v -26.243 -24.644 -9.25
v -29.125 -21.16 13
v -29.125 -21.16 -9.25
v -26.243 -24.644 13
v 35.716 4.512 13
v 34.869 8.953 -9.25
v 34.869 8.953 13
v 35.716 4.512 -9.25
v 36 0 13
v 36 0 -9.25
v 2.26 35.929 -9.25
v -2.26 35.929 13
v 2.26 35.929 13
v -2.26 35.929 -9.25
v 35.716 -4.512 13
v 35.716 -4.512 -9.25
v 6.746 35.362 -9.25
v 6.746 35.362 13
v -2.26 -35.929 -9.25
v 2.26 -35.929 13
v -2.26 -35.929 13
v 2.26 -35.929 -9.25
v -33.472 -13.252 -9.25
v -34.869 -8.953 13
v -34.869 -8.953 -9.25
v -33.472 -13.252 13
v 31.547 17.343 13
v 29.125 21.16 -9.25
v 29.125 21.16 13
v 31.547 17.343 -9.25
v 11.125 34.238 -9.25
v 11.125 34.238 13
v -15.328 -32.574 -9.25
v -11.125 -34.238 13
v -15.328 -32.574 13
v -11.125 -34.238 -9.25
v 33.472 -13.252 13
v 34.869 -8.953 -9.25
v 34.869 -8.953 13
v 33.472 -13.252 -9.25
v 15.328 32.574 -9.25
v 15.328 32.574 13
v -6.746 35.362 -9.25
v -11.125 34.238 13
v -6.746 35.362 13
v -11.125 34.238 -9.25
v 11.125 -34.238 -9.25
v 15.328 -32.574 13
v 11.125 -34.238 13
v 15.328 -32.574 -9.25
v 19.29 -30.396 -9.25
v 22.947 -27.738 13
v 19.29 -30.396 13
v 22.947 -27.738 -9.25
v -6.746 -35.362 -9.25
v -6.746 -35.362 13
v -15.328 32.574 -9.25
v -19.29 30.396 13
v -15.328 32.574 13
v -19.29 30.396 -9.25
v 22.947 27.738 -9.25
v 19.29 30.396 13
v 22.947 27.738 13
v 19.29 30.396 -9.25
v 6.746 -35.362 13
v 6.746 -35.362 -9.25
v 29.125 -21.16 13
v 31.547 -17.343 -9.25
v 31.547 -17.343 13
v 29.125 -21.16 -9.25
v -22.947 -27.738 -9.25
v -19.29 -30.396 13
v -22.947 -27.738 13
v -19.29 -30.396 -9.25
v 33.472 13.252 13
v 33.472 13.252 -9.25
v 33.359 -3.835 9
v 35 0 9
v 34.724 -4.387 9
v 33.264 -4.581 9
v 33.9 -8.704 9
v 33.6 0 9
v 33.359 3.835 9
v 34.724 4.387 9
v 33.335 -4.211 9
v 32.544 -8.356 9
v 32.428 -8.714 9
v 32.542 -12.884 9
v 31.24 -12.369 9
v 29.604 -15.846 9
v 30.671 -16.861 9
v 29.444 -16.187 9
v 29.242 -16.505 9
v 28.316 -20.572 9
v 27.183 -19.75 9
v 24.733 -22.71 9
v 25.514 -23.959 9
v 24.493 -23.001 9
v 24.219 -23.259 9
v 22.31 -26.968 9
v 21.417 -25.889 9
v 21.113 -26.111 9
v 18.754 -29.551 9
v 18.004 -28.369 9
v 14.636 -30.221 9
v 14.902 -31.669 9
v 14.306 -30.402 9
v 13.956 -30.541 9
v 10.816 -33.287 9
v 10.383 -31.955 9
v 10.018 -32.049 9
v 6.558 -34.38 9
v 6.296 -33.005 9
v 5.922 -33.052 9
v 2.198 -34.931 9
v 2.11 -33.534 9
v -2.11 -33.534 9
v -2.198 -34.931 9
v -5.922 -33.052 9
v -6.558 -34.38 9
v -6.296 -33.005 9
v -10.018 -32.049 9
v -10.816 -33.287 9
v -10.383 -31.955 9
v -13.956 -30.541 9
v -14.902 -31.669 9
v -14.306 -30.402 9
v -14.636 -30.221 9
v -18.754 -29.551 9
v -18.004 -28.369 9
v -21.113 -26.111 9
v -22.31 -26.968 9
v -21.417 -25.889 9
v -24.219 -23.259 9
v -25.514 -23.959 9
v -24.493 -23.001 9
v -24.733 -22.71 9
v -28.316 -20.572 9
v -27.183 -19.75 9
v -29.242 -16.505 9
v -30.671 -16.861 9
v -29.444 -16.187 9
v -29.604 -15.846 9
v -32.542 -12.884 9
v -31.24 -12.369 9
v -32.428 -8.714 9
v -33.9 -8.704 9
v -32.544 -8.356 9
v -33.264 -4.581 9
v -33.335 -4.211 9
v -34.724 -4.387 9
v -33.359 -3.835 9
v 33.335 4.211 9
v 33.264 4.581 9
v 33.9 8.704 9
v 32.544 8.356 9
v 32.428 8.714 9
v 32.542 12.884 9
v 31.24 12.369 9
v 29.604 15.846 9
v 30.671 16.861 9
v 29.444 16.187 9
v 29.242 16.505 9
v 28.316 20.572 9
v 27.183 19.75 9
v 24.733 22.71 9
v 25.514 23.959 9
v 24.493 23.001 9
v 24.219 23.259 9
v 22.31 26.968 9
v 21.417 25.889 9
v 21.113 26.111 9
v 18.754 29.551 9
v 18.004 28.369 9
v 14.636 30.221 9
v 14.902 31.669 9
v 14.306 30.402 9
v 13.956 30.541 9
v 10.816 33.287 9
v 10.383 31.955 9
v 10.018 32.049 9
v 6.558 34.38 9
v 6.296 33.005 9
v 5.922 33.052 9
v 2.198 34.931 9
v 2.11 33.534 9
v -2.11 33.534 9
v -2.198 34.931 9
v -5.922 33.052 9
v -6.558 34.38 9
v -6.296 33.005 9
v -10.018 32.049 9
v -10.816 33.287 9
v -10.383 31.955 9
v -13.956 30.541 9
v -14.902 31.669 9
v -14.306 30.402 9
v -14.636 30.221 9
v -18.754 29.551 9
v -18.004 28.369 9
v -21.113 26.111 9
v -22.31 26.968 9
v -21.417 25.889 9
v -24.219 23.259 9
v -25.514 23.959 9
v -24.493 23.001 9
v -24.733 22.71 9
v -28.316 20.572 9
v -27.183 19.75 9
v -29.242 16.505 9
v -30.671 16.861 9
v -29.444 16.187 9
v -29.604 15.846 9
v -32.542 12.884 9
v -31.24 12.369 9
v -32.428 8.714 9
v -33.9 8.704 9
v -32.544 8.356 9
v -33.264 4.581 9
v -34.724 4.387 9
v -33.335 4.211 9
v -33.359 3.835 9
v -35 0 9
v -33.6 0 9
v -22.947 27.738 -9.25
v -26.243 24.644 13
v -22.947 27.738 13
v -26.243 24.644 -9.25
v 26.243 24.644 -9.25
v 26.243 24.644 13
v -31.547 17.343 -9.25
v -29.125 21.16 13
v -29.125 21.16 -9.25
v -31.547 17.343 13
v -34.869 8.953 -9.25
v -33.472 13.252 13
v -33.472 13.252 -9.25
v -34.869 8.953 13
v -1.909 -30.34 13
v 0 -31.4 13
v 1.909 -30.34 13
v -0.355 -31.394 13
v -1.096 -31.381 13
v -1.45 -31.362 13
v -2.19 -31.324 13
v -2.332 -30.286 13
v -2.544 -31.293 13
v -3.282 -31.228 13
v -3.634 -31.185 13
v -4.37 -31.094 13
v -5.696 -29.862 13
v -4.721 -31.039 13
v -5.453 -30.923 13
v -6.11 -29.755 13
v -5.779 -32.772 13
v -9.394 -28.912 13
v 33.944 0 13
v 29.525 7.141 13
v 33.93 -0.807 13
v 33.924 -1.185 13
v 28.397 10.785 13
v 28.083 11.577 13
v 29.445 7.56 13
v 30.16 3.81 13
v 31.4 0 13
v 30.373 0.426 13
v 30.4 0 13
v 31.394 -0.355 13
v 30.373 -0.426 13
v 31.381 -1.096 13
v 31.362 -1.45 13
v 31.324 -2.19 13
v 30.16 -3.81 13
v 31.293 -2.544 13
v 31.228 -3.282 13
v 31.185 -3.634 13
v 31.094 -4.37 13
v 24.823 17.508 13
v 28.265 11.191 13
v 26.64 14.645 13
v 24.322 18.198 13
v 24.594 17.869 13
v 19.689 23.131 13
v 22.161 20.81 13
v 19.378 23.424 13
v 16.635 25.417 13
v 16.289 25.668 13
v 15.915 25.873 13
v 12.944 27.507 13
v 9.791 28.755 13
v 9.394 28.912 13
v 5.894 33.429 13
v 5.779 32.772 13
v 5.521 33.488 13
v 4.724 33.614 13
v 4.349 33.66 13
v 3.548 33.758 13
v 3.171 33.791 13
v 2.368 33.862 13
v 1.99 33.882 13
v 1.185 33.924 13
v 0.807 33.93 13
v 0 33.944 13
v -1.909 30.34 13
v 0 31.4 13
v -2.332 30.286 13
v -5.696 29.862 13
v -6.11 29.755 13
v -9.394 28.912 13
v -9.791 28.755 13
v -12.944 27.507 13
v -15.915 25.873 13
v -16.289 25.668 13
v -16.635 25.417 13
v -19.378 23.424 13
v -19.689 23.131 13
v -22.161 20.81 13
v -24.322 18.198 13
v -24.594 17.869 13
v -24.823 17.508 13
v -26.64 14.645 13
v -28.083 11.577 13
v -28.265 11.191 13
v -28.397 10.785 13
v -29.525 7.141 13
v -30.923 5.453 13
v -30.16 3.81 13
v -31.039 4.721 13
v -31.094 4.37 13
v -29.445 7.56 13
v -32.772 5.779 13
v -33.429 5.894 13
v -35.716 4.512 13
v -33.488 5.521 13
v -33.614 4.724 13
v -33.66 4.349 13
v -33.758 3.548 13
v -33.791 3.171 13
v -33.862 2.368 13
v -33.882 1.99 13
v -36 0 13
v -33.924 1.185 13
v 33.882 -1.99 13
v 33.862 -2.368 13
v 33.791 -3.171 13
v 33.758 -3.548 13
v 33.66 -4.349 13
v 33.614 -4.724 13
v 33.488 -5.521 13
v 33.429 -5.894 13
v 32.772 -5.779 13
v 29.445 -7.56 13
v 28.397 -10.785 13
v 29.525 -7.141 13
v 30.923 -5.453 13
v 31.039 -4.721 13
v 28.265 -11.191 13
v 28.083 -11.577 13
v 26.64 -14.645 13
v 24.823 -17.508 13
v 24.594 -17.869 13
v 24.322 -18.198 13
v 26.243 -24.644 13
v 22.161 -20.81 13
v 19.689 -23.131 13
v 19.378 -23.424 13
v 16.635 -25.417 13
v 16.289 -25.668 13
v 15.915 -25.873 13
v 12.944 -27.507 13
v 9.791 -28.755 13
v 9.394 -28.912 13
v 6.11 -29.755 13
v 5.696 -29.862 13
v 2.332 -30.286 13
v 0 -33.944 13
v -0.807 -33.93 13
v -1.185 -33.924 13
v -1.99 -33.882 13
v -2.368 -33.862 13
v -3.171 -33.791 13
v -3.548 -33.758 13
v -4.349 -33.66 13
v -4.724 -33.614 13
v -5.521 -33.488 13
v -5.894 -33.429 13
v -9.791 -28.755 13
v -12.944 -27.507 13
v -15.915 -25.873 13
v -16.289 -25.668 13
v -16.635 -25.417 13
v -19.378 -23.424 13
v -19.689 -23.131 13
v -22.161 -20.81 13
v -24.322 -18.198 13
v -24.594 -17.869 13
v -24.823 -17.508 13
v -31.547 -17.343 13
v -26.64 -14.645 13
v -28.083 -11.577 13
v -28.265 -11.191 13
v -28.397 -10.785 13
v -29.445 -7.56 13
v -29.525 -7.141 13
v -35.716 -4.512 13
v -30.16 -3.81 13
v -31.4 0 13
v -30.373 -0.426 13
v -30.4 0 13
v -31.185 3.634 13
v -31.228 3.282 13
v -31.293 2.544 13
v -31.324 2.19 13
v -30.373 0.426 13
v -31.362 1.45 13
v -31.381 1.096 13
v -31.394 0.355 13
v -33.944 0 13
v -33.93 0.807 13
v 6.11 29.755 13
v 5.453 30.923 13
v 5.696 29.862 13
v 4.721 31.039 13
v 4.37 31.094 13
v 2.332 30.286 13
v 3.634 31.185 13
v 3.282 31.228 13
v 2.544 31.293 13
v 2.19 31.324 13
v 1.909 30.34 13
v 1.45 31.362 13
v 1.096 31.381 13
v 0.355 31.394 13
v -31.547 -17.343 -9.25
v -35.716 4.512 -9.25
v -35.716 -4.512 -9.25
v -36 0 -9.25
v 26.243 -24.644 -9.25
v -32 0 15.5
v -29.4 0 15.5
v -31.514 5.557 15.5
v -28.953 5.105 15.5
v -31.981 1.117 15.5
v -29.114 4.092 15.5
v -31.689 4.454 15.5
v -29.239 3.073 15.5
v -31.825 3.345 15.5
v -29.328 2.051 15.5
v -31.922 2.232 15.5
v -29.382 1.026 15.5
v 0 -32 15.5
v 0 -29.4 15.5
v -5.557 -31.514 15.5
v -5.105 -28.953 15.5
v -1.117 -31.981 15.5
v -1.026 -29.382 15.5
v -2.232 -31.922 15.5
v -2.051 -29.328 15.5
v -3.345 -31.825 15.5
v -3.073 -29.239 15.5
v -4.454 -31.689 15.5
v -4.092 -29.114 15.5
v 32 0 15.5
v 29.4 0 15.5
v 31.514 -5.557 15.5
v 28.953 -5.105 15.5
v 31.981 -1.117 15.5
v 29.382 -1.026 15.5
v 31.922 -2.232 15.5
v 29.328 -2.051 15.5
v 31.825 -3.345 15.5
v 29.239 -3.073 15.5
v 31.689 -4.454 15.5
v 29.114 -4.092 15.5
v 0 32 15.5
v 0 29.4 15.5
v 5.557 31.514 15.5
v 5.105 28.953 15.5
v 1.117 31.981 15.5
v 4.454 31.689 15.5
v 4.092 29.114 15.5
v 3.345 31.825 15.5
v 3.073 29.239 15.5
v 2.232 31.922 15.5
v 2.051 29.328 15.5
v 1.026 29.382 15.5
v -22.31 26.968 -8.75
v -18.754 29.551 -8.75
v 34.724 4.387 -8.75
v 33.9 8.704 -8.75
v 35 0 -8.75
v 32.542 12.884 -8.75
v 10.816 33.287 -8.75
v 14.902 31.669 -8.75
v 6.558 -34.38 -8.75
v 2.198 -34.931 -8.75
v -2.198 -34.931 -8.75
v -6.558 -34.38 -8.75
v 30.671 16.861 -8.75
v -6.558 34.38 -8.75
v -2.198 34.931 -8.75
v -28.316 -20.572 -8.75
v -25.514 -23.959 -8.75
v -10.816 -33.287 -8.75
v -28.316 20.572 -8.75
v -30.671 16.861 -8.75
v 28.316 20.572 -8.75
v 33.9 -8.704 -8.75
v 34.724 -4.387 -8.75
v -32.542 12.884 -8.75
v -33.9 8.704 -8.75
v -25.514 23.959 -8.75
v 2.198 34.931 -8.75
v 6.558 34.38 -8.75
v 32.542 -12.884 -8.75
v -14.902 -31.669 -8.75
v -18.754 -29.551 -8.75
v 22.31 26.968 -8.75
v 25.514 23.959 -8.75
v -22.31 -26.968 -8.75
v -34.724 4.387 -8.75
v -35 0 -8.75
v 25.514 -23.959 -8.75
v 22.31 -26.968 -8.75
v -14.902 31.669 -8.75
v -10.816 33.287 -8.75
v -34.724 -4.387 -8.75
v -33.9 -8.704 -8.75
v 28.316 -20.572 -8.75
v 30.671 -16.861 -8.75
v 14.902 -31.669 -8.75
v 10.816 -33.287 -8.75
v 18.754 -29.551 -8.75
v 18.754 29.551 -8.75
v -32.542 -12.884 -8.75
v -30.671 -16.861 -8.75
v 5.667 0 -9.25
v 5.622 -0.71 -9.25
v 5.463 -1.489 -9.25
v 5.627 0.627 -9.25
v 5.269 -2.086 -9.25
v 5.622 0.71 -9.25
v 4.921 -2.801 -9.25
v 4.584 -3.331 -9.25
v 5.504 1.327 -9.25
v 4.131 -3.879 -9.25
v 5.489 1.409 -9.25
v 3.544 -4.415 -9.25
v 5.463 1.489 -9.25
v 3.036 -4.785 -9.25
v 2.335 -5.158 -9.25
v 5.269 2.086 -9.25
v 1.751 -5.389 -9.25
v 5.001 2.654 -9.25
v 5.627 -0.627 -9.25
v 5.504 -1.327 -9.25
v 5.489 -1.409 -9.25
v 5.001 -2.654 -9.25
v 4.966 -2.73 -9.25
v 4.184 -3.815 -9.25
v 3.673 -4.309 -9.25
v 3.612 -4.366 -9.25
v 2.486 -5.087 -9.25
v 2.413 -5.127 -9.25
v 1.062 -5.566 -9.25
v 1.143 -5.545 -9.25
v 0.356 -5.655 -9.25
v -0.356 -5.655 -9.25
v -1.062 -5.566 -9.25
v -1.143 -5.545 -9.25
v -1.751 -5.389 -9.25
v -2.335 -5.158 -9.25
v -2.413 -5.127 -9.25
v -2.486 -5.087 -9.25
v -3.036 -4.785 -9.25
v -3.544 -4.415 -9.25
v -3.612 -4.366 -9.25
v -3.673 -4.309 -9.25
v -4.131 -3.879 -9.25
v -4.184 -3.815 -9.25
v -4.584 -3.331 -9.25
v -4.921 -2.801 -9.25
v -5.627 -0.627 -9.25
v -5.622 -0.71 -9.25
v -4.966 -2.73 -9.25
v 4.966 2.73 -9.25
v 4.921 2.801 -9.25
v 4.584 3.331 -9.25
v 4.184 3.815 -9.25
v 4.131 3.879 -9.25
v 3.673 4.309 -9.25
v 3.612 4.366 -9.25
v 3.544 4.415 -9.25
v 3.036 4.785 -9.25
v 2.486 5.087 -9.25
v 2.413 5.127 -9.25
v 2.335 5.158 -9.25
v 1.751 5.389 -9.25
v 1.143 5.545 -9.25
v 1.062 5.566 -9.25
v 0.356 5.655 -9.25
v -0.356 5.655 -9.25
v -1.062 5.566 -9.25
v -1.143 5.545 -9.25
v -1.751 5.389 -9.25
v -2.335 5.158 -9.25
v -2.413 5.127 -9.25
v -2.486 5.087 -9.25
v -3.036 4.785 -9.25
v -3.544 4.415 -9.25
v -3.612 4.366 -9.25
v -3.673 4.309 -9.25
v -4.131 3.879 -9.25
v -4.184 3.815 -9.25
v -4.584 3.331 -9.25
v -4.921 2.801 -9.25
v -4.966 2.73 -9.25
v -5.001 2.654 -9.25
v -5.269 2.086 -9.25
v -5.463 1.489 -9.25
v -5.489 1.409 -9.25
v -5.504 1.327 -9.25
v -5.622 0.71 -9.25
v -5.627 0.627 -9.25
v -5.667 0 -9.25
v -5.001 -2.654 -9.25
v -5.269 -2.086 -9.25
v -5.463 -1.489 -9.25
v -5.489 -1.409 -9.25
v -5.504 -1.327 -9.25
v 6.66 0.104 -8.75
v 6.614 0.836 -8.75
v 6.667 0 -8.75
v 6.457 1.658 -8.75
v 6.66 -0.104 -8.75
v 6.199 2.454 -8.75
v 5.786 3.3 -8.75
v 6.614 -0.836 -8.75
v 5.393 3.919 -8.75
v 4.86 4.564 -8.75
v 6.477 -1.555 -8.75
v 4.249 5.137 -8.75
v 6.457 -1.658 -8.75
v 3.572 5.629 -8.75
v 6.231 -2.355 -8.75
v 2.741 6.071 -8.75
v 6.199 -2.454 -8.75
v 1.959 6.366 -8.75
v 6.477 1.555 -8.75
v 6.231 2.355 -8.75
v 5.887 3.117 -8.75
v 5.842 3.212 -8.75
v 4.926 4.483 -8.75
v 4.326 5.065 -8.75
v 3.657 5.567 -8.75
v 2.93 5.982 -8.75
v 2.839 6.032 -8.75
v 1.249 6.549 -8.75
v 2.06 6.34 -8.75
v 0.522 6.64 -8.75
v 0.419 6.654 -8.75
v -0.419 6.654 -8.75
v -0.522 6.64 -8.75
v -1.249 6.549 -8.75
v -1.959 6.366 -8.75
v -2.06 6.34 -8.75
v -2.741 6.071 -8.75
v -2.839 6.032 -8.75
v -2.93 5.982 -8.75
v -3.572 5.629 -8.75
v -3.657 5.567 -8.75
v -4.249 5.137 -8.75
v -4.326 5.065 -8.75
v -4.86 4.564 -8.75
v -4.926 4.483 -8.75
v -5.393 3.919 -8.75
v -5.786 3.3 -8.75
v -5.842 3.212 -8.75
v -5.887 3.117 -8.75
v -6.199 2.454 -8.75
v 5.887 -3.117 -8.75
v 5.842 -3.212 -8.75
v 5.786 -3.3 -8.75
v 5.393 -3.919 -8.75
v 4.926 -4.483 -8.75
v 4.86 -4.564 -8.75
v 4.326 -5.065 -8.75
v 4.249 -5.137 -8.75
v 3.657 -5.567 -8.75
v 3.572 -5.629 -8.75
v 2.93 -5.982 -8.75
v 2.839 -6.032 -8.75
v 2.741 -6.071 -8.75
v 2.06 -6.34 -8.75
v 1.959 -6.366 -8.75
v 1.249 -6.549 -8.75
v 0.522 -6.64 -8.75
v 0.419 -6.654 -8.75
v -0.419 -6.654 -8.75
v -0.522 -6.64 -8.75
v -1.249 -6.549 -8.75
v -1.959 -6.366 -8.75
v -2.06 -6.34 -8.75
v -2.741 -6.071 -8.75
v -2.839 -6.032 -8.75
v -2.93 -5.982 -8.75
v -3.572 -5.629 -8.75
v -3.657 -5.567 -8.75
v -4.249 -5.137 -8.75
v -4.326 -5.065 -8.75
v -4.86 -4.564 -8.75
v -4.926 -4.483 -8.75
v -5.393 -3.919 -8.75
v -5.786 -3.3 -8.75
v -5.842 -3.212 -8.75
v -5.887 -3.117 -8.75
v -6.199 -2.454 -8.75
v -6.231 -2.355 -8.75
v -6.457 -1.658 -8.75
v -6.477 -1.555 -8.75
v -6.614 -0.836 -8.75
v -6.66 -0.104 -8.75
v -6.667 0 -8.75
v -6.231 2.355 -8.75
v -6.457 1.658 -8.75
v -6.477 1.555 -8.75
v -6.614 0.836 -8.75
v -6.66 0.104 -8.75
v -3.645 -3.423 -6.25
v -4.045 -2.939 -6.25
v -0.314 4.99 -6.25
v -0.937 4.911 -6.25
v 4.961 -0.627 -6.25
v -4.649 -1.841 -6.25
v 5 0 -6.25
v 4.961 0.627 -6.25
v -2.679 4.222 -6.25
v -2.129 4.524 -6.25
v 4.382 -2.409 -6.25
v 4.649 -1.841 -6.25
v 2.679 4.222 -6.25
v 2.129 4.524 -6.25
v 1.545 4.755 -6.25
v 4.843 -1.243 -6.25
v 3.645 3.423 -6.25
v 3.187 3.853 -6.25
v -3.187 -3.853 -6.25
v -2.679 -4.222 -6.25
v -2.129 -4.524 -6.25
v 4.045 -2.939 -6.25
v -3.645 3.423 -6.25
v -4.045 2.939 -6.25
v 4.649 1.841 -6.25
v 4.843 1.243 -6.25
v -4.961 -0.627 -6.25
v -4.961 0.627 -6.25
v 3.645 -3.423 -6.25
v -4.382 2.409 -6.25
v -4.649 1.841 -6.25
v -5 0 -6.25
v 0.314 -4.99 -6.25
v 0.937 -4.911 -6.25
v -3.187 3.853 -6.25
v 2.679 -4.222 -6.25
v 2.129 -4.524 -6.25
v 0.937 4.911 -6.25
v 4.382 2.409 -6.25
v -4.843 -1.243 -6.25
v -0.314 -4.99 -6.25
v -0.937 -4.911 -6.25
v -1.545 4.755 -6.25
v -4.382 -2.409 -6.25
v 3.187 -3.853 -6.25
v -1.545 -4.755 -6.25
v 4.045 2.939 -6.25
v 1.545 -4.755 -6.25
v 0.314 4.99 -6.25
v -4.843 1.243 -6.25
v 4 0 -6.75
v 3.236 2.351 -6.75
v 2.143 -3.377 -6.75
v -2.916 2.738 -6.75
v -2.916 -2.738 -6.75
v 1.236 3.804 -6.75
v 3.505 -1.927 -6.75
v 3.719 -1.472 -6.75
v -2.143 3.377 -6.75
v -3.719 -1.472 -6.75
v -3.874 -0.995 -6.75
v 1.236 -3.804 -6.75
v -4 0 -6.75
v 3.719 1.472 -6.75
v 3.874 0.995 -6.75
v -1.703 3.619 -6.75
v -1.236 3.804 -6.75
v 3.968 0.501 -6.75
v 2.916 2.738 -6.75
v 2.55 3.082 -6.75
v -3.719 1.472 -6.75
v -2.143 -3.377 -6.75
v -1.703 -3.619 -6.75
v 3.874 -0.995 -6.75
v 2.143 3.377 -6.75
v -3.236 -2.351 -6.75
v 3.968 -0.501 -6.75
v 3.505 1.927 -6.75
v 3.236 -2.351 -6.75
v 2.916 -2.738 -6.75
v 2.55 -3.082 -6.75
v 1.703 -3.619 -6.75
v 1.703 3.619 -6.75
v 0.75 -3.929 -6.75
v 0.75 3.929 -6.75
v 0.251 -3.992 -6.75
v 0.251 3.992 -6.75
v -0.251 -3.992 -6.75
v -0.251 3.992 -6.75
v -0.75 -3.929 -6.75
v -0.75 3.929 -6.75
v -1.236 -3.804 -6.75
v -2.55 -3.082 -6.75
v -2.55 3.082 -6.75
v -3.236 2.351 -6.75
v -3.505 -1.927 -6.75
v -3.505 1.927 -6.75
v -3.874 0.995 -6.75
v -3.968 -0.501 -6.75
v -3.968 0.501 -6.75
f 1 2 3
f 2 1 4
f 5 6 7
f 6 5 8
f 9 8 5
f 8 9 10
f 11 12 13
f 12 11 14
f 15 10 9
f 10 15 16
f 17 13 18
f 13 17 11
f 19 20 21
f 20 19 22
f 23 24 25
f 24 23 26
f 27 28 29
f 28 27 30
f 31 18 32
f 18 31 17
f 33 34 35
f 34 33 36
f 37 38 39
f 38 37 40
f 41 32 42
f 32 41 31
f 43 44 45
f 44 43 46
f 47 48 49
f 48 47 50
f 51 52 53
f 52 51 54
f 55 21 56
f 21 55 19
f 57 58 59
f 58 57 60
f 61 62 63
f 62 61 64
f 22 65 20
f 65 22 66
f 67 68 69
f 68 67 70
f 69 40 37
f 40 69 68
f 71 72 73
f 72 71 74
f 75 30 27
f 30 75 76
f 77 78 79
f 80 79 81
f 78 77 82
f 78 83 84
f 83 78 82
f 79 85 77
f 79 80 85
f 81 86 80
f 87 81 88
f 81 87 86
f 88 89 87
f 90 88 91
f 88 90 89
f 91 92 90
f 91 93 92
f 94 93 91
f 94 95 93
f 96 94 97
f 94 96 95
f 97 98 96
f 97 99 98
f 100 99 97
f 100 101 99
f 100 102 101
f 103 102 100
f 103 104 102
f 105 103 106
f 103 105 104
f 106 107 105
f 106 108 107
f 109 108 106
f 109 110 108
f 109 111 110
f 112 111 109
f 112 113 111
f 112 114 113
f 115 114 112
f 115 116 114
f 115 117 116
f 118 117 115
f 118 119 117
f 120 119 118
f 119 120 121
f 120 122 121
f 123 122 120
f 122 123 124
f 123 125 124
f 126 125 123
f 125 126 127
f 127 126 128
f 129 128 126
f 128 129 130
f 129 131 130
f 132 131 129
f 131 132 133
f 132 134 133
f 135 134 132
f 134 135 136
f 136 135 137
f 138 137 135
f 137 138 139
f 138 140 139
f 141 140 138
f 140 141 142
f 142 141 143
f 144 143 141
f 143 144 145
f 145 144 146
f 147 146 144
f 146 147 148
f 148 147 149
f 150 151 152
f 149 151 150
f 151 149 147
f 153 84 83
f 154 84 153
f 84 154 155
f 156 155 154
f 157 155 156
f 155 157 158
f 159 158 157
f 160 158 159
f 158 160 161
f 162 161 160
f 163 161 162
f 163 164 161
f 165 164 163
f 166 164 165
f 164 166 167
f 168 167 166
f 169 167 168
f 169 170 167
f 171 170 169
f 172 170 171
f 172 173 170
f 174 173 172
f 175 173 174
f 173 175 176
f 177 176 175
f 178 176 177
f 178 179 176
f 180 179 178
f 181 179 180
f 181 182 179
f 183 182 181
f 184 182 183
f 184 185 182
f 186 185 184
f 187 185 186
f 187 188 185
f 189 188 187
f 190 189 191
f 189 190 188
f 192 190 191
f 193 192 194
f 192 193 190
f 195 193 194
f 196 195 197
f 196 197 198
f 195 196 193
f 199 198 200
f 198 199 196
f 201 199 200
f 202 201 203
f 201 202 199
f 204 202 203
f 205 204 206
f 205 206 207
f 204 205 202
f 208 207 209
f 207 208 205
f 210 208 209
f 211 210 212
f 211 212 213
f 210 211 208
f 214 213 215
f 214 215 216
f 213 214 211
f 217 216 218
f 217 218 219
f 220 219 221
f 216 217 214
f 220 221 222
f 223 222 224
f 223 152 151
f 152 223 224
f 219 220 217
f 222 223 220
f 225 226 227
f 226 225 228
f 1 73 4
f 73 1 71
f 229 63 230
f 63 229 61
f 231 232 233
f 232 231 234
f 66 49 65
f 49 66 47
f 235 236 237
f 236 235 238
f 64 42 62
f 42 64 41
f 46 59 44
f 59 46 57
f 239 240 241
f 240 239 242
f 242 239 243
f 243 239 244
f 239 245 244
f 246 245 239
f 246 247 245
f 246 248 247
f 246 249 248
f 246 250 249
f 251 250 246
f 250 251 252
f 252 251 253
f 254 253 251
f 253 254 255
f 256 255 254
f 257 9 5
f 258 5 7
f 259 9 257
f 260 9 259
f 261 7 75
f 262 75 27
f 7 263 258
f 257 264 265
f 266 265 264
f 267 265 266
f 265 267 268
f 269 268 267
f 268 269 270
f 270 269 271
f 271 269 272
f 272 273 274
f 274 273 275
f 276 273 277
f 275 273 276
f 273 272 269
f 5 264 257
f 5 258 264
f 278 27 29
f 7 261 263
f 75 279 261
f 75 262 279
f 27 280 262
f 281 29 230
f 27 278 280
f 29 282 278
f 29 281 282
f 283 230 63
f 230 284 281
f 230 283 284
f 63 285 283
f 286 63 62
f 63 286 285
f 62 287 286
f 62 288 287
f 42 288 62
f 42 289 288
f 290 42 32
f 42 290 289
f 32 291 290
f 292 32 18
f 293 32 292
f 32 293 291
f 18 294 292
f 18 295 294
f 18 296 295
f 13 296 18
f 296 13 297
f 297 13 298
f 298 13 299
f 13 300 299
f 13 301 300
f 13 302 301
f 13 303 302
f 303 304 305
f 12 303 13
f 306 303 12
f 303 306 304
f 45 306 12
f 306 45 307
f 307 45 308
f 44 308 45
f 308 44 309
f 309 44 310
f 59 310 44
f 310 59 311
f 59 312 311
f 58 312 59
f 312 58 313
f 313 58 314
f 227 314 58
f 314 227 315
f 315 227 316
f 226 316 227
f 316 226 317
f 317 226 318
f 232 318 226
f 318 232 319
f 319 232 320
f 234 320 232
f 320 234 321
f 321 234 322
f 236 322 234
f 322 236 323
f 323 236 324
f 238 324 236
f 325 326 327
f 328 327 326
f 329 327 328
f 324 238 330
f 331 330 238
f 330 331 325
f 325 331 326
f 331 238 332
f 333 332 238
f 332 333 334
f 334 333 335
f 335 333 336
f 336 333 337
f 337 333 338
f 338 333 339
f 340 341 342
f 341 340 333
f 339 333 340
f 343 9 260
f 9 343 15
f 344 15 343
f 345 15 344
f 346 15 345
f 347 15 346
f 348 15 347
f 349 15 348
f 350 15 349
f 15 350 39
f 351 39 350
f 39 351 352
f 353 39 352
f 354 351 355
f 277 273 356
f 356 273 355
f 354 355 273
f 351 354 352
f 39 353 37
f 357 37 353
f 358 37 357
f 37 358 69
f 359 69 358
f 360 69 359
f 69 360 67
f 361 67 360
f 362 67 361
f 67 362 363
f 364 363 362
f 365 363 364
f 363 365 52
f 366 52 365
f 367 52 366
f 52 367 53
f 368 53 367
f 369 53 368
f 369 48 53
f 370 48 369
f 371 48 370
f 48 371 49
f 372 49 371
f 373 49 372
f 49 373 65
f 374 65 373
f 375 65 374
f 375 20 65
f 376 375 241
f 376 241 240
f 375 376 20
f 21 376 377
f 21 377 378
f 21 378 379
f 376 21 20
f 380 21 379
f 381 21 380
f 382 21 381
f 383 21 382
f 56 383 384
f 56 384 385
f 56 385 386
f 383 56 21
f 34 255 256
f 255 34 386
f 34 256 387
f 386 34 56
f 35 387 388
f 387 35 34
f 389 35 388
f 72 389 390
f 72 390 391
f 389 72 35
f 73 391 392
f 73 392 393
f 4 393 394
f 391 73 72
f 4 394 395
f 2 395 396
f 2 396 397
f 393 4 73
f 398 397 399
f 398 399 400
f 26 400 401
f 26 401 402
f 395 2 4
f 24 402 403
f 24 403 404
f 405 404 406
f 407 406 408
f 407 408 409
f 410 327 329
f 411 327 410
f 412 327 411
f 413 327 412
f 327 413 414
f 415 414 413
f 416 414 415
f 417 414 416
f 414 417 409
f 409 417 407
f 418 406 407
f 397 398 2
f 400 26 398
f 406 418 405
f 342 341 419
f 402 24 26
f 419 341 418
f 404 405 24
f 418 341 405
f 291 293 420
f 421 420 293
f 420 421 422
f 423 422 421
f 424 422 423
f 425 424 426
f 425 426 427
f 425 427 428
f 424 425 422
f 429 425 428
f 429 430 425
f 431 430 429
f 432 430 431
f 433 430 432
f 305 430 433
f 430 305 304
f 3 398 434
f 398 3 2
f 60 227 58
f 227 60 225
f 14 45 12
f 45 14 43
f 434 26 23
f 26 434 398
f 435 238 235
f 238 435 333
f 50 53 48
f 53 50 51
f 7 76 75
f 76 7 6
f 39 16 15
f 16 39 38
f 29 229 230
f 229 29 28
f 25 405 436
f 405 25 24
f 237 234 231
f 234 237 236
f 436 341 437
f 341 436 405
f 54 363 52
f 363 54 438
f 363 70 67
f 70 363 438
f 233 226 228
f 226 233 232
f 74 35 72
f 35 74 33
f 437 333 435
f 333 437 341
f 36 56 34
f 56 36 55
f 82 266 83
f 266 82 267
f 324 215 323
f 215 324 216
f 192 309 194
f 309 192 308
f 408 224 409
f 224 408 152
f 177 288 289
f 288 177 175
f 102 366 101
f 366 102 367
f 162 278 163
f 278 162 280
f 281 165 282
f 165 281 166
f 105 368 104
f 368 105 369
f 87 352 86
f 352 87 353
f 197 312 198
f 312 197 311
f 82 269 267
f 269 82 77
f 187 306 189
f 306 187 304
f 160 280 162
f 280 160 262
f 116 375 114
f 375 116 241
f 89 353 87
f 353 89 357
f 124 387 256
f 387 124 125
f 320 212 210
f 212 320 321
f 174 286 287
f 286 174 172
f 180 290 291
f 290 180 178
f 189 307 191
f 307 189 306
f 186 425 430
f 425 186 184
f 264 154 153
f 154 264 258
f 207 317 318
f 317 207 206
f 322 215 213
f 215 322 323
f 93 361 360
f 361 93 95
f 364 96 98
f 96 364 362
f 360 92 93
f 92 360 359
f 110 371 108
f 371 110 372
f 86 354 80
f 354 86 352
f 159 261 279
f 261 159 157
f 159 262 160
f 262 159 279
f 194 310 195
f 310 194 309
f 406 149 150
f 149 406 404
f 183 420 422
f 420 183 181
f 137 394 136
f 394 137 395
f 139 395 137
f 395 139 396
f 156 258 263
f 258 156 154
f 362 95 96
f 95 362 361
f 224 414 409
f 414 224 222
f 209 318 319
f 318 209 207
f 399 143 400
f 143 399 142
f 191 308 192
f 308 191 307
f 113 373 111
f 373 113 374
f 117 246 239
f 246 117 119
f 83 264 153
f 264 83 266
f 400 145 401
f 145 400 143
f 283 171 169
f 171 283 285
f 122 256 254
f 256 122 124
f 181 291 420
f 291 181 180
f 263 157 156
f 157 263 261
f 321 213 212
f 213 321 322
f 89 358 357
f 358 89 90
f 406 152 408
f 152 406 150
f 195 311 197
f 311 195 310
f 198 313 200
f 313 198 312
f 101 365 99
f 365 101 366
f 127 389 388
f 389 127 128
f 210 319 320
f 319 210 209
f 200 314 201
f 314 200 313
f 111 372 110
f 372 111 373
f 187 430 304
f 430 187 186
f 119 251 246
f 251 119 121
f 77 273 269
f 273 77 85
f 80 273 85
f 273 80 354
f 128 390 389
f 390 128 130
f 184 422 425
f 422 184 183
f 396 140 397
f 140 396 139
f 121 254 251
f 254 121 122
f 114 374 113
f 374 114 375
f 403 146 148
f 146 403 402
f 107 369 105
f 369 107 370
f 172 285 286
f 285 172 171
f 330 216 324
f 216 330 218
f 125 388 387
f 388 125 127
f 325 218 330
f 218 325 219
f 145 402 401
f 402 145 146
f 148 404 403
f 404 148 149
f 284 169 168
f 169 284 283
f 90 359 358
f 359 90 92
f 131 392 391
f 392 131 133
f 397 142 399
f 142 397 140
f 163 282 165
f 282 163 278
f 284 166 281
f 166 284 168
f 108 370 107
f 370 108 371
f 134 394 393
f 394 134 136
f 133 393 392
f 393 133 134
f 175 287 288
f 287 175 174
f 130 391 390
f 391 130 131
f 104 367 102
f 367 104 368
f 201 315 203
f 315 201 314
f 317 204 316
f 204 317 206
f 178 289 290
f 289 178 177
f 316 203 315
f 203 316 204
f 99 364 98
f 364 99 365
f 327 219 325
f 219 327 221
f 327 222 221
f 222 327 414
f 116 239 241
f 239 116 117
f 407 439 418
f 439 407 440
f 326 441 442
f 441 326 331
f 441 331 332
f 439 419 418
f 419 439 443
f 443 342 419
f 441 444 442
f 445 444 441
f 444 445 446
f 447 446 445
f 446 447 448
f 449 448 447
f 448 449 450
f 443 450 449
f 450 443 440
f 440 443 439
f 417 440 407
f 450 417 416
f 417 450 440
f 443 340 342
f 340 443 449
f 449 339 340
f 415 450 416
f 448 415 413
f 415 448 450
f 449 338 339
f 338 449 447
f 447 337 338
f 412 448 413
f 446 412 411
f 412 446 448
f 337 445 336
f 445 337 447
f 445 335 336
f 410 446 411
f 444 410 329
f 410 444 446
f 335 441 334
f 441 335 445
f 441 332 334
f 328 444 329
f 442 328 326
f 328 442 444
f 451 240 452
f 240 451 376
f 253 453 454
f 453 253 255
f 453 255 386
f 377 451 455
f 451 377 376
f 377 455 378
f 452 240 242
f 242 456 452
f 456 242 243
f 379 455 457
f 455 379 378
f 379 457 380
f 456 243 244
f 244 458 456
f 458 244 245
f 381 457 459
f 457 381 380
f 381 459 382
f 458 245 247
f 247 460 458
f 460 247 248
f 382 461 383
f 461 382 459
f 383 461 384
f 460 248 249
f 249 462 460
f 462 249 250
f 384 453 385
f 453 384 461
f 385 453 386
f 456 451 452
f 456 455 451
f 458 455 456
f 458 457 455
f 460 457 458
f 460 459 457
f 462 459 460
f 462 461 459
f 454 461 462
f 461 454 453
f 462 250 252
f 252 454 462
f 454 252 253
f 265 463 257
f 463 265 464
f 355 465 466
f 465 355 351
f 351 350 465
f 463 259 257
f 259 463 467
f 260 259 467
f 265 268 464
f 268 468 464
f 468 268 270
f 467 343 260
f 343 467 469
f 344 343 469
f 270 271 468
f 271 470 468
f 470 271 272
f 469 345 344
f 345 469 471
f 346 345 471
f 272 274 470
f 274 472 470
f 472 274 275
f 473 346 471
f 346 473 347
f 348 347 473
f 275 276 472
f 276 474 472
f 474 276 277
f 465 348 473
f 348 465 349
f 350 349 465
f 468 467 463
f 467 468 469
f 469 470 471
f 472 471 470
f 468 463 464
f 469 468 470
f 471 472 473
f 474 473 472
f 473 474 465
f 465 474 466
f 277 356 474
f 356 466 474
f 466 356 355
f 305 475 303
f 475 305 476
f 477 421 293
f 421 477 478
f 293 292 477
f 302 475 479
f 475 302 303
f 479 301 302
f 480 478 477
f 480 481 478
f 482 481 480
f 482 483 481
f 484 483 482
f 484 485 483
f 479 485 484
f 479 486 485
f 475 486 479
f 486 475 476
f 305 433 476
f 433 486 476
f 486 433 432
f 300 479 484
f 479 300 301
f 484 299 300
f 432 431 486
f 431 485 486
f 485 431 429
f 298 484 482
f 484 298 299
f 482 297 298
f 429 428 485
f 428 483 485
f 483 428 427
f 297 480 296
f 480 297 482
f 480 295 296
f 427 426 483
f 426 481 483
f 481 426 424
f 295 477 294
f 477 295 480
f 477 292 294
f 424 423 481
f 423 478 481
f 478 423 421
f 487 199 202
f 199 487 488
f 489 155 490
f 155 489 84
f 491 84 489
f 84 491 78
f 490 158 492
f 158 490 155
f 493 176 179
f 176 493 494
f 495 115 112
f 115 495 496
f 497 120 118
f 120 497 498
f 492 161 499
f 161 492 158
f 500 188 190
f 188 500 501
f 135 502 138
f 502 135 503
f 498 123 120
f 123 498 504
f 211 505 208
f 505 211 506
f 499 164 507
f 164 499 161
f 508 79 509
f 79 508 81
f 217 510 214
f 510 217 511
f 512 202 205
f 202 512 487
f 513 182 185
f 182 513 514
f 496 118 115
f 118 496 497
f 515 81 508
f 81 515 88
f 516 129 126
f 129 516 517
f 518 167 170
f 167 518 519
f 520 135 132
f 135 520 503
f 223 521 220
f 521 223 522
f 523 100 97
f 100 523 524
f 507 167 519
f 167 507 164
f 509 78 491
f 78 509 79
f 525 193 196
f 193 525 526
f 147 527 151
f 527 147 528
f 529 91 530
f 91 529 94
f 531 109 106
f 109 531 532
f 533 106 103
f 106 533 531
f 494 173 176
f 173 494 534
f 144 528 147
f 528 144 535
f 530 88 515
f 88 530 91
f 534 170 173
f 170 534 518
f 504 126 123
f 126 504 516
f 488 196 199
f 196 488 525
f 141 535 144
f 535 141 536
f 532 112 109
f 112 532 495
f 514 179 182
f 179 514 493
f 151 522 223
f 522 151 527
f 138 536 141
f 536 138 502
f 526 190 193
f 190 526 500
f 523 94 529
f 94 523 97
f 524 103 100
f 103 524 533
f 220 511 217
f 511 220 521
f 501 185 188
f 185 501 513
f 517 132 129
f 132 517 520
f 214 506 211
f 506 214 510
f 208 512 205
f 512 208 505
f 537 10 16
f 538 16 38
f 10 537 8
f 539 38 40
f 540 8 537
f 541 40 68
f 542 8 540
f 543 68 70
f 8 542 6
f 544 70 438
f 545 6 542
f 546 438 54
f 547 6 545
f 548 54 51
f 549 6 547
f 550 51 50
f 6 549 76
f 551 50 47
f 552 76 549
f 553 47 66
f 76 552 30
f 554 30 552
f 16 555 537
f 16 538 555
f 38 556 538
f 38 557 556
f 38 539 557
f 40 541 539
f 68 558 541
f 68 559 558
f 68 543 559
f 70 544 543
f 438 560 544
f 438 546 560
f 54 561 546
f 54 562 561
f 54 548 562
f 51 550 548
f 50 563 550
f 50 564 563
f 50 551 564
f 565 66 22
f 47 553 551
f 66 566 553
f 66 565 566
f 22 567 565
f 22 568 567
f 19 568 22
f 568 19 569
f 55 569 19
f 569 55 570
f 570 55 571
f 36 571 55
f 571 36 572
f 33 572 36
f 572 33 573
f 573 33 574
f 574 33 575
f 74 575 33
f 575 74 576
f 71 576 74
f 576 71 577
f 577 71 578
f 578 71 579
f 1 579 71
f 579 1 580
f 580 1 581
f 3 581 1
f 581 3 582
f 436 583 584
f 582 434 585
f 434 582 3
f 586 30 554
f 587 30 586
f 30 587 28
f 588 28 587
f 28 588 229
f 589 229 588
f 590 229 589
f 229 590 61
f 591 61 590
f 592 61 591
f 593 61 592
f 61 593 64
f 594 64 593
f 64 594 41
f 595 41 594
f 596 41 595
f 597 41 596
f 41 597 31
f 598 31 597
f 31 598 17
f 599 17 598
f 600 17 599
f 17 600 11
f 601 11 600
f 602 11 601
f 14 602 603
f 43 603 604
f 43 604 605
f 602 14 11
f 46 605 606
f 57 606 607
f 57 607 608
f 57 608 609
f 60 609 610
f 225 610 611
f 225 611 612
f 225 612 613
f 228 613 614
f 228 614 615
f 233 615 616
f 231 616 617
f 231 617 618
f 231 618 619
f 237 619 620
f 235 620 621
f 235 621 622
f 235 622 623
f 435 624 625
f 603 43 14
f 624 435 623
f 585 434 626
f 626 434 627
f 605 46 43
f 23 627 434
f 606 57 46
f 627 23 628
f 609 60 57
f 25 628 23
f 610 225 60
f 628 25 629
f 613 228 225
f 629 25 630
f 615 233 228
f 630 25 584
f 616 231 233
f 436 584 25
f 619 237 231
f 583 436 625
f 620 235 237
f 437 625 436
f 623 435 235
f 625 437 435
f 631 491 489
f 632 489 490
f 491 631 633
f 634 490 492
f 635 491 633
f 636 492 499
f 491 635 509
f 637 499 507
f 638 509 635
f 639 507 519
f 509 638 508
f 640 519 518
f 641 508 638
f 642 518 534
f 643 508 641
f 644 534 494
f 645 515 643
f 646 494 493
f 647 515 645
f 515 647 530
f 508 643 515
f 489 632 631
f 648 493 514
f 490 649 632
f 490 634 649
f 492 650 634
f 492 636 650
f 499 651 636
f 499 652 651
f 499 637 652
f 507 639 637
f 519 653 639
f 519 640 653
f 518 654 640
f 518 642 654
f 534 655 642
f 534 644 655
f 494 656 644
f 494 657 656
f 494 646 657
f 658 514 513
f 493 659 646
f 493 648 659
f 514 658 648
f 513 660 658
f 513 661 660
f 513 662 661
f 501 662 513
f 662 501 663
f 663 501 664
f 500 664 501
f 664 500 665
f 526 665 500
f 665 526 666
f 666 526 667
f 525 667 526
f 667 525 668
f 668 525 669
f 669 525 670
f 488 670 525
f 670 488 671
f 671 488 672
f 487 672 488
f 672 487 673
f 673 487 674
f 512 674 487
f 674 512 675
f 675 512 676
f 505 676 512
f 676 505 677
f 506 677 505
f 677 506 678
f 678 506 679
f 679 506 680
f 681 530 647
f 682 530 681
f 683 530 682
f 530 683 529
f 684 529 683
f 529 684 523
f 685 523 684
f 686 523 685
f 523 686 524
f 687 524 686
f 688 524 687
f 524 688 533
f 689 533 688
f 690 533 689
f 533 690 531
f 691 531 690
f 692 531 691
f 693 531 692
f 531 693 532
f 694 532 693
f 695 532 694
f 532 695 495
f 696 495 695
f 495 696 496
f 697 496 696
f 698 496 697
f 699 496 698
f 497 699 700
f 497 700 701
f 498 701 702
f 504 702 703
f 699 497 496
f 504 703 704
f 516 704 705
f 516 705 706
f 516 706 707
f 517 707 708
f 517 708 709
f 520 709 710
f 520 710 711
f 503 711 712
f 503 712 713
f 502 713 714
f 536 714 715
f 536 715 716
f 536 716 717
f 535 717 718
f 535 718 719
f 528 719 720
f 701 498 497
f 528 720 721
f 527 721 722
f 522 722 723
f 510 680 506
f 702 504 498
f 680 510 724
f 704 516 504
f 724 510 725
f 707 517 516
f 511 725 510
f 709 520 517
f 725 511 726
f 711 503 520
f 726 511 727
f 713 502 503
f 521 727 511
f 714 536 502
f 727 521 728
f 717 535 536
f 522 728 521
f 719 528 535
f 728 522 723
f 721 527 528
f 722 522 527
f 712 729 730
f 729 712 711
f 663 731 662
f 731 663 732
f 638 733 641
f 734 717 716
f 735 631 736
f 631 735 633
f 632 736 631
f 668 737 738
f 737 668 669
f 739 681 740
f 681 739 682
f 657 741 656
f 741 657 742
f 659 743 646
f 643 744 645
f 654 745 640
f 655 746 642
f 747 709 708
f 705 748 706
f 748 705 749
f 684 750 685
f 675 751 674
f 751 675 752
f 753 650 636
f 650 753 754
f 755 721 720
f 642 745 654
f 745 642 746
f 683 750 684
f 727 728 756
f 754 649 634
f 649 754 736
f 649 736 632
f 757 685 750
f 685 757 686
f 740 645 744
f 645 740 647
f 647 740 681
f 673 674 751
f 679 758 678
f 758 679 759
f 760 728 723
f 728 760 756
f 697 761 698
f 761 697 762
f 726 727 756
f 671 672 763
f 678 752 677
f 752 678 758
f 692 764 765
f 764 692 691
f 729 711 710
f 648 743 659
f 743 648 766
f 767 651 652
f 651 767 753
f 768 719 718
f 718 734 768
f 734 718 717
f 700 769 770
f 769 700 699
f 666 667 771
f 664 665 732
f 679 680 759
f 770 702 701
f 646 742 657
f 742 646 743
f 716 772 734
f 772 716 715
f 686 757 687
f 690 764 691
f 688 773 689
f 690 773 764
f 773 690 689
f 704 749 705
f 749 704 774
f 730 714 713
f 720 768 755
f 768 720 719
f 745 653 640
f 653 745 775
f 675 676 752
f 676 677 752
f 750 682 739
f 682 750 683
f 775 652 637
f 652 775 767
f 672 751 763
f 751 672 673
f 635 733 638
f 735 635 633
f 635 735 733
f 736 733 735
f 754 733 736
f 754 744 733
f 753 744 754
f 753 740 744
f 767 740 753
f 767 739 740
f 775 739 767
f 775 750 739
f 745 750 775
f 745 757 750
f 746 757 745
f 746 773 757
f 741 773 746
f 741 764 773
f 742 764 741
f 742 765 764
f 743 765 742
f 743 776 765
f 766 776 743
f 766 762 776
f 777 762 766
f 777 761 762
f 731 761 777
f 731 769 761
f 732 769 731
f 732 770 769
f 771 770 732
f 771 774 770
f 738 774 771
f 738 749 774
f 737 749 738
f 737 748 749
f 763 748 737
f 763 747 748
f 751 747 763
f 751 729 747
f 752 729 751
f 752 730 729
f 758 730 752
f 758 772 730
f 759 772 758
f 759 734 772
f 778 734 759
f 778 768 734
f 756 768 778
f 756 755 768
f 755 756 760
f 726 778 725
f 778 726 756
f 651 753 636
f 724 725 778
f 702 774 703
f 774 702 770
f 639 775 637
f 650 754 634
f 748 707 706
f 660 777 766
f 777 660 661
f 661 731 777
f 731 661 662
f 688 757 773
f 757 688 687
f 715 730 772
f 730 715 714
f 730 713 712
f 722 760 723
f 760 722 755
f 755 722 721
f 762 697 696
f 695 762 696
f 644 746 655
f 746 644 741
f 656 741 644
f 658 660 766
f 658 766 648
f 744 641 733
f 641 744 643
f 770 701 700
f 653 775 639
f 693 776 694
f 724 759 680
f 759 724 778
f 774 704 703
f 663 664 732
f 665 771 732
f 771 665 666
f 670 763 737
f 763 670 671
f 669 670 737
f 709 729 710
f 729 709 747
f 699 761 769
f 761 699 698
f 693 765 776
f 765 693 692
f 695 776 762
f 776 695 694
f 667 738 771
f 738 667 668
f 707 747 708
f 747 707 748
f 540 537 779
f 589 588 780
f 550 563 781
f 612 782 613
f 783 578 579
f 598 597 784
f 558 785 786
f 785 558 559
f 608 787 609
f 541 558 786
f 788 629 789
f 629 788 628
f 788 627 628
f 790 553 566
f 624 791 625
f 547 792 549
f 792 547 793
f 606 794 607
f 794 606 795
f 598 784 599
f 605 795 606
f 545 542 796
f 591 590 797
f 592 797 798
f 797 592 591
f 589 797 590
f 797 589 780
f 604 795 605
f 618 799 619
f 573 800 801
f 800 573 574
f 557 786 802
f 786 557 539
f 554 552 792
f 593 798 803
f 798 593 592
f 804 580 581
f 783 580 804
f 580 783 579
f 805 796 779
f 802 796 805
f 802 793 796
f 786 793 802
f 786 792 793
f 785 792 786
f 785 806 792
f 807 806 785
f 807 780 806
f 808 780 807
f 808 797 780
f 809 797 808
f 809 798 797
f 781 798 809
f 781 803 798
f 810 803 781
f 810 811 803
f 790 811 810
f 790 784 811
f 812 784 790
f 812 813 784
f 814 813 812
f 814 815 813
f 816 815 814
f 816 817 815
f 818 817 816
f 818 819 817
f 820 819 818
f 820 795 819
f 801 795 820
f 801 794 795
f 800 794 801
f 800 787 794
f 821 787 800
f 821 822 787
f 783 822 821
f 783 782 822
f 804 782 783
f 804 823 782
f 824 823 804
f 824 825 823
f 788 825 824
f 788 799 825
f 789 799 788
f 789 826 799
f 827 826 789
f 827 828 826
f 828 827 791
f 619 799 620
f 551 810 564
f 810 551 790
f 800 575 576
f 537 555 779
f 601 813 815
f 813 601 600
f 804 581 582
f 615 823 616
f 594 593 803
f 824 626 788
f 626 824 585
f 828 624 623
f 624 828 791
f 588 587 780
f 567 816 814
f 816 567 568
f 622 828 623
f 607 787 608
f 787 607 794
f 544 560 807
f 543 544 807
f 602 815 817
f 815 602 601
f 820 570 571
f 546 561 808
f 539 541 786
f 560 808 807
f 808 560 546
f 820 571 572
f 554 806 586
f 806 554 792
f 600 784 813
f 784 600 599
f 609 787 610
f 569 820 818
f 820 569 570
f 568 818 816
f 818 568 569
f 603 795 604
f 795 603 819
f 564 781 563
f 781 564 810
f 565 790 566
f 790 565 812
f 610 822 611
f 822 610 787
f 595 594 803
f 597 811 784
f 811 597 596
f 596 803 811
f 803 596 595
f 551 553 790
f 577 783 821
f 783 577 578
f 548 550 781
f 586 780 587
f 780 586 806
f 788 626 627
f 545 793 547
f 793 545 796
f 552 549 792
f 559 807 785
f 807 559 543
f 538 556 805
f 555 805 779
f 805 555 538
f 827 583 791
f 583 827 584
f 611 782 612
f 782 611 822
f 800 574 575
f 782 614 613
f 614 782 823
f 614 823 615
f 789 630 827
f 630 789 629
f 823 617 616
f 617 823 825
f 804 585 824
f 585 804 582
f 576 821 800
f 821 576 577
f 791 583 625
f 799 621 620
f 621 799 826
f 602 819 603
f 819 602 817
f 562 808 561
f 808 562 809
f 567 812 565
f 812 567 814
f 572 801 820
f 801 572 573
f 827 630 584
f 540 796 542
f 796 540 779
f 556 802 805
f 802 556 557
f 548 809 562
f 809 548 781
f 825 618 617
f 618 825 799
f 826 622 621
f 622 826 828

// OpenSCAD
// file: receiver.scad
module receiver(){
    //CoilDimensions
    coilLength = 41;
    coilDepth = 29;
    coilHeight = 0.3;
    coilDimensions = [coilLength, coilDepth, coilHeight];
    //CoilHoleDimensions
    coilHoleLength = 23;
    coilHoleDepth = 10;
    coilHoleHeight = 2 * coilHeight;
    coilHoleDimensions = [coilHoleLength, coilHoleDepth, coilHoleHeight];
    //ChipDimensions
    chipLength = 19;
    chipDepth = 32.5;
    chipHeight = 1.1;
    chipDimensions = [chipLength, chipDepth, chipHeight];
    
    coil_chip_spacing = 3;
    module receiverCoil(coilDimensions, coilHoleDimensions){
        difference(){
            cube(coilDimensions);
            trans = [(coilDimensions.x - coilHoleDimensions.x) / 2,
            (coilDimensions.y - coilHoleDimensions.y) / 2,
            -(coilHoleDimensions.z - coilDimensions.z) / 2];
            translate(trans){
                color([1.0, 0.0, 0.0, 1.0]){
                    cube(coilHoleDimensions);
                }
            }
        }
    }
    center = [chipLength + coil_chip_spacing,
    0, 0];
    translate(center){
        receiverCoil(coilDimensions, coilHoleDimensions);
        trans = [-coil_chip_spacing - chipLength,
        -(chipDepth - coilDepth) / 2,
        -(chipHeight - coilHeight) / 2];
        translate(trans){
            cube(chipDimensions);
        }
    }
}

receiver();
// main file
use <receiver.scad>

//receiver();

module receiverCase(bottomDiameter){
    botrad = bottomDiameter / 2;
    receiverDiameter = 70;
    receiverRad = receiverDiameter / 2;
    union(){
        translate([0, 0, 11]){
            difference(){
                cylinder(4, receiverRad + 1, botrad, true);
                cylinder(5, receiverRad - 1, botrad - 6, true);
            }
        }        
        difference(){
            translate([0, 0, 14]){
                for(i=[0:1:3]){
                    rotate([0, 0, i * 90]){
                        lasche();
                    }
                }
            }
            translate([0, 0, 9]){
                cylinder(7, bottomDiameter, bottomDiameter, true);
            }
        }
        difference(){
            cylinder(18, receiverRad + 1, receiverRad + 1, true);
            cylinder(20, receiverRad, receiverRad, true);
        }
        translate([0, 0, -9]){
            difference(){
                cylinder(0.5, receiverRad + 1, receiverRad + 1, true);
                translate([0, 0, 1.20]){
                    cylinder(3, 7, 5, true);
                }
            }
        }
        translate([0, 0, -7.75]){
            color([1.0, 0.0, 0.0]){
                difference(){
                    cylinder(3, 7, 5, true);
                    translate([0, 0, -0.5]){
                        cylinder(3, 6, 4, true);
                    }
                }
            }
        }
    }

    
    module lasche(){
        rotate([0, -180, 0]){
            rotate_extrude(angle = 10, convexity = 20, $fn=200){
                projection(cut = true){
                    rotate([90, 0, 0]){
                        difference(){
                            translate([0, 0, -3]){
                                difference(){
                                    cylinder(9, botrad + 3, botrad - 4, true);
                                    cylinder(10, botrad + 1, botrad - 7, true);
                                }
                            }
                            difference(){
                                translate([-bottomDiameter * 1.2 / 2, -bottomDiameter * 1.2 / 2, -8]){
                                    cube([bottomDiameter * 1.2, bottomDiameter * 1.2, 12]);
                                }
                                translate([0, -0.5, -10]){
                                    cube([bottomDiameter * 1.1, 1, 20]);
                                }
                            }   
                        }
                    }
                }
            }
        }
    }
}

$fn=50;
minkowski(){
    receiverCase(67 + 5);

/*
    intersection(){
        receiverCase(67 + 5);
        translate([0, 0, 14]){
            cylinder(5, 120, 120, true);
        }
    }
    */
}


/*
union(){
    translate([-5, -5, -3]){
        translate([0, 0, 1.5]){
            cube([75, 45, 0.5]);
        }
        difference(){
            translate([0, 0, 2]){
                difference(){
                    cube([75, 45, 15]);
                    translate([2, 2, -1]){
                        cube([71, 41, 17]);
                    }
                }
            }
            translate([1, 1, 13.5]){
                cube([75, 43, 2]);
            }
        }
    }
}
*/
/*
translate([1, 1.5, 13.75]){
    difference(){
        cube([78, 42, 1.5]);
        translate([-1, 2, -0.5]){
            cube([9, 8, 3]);
        }
    }
}
*/
